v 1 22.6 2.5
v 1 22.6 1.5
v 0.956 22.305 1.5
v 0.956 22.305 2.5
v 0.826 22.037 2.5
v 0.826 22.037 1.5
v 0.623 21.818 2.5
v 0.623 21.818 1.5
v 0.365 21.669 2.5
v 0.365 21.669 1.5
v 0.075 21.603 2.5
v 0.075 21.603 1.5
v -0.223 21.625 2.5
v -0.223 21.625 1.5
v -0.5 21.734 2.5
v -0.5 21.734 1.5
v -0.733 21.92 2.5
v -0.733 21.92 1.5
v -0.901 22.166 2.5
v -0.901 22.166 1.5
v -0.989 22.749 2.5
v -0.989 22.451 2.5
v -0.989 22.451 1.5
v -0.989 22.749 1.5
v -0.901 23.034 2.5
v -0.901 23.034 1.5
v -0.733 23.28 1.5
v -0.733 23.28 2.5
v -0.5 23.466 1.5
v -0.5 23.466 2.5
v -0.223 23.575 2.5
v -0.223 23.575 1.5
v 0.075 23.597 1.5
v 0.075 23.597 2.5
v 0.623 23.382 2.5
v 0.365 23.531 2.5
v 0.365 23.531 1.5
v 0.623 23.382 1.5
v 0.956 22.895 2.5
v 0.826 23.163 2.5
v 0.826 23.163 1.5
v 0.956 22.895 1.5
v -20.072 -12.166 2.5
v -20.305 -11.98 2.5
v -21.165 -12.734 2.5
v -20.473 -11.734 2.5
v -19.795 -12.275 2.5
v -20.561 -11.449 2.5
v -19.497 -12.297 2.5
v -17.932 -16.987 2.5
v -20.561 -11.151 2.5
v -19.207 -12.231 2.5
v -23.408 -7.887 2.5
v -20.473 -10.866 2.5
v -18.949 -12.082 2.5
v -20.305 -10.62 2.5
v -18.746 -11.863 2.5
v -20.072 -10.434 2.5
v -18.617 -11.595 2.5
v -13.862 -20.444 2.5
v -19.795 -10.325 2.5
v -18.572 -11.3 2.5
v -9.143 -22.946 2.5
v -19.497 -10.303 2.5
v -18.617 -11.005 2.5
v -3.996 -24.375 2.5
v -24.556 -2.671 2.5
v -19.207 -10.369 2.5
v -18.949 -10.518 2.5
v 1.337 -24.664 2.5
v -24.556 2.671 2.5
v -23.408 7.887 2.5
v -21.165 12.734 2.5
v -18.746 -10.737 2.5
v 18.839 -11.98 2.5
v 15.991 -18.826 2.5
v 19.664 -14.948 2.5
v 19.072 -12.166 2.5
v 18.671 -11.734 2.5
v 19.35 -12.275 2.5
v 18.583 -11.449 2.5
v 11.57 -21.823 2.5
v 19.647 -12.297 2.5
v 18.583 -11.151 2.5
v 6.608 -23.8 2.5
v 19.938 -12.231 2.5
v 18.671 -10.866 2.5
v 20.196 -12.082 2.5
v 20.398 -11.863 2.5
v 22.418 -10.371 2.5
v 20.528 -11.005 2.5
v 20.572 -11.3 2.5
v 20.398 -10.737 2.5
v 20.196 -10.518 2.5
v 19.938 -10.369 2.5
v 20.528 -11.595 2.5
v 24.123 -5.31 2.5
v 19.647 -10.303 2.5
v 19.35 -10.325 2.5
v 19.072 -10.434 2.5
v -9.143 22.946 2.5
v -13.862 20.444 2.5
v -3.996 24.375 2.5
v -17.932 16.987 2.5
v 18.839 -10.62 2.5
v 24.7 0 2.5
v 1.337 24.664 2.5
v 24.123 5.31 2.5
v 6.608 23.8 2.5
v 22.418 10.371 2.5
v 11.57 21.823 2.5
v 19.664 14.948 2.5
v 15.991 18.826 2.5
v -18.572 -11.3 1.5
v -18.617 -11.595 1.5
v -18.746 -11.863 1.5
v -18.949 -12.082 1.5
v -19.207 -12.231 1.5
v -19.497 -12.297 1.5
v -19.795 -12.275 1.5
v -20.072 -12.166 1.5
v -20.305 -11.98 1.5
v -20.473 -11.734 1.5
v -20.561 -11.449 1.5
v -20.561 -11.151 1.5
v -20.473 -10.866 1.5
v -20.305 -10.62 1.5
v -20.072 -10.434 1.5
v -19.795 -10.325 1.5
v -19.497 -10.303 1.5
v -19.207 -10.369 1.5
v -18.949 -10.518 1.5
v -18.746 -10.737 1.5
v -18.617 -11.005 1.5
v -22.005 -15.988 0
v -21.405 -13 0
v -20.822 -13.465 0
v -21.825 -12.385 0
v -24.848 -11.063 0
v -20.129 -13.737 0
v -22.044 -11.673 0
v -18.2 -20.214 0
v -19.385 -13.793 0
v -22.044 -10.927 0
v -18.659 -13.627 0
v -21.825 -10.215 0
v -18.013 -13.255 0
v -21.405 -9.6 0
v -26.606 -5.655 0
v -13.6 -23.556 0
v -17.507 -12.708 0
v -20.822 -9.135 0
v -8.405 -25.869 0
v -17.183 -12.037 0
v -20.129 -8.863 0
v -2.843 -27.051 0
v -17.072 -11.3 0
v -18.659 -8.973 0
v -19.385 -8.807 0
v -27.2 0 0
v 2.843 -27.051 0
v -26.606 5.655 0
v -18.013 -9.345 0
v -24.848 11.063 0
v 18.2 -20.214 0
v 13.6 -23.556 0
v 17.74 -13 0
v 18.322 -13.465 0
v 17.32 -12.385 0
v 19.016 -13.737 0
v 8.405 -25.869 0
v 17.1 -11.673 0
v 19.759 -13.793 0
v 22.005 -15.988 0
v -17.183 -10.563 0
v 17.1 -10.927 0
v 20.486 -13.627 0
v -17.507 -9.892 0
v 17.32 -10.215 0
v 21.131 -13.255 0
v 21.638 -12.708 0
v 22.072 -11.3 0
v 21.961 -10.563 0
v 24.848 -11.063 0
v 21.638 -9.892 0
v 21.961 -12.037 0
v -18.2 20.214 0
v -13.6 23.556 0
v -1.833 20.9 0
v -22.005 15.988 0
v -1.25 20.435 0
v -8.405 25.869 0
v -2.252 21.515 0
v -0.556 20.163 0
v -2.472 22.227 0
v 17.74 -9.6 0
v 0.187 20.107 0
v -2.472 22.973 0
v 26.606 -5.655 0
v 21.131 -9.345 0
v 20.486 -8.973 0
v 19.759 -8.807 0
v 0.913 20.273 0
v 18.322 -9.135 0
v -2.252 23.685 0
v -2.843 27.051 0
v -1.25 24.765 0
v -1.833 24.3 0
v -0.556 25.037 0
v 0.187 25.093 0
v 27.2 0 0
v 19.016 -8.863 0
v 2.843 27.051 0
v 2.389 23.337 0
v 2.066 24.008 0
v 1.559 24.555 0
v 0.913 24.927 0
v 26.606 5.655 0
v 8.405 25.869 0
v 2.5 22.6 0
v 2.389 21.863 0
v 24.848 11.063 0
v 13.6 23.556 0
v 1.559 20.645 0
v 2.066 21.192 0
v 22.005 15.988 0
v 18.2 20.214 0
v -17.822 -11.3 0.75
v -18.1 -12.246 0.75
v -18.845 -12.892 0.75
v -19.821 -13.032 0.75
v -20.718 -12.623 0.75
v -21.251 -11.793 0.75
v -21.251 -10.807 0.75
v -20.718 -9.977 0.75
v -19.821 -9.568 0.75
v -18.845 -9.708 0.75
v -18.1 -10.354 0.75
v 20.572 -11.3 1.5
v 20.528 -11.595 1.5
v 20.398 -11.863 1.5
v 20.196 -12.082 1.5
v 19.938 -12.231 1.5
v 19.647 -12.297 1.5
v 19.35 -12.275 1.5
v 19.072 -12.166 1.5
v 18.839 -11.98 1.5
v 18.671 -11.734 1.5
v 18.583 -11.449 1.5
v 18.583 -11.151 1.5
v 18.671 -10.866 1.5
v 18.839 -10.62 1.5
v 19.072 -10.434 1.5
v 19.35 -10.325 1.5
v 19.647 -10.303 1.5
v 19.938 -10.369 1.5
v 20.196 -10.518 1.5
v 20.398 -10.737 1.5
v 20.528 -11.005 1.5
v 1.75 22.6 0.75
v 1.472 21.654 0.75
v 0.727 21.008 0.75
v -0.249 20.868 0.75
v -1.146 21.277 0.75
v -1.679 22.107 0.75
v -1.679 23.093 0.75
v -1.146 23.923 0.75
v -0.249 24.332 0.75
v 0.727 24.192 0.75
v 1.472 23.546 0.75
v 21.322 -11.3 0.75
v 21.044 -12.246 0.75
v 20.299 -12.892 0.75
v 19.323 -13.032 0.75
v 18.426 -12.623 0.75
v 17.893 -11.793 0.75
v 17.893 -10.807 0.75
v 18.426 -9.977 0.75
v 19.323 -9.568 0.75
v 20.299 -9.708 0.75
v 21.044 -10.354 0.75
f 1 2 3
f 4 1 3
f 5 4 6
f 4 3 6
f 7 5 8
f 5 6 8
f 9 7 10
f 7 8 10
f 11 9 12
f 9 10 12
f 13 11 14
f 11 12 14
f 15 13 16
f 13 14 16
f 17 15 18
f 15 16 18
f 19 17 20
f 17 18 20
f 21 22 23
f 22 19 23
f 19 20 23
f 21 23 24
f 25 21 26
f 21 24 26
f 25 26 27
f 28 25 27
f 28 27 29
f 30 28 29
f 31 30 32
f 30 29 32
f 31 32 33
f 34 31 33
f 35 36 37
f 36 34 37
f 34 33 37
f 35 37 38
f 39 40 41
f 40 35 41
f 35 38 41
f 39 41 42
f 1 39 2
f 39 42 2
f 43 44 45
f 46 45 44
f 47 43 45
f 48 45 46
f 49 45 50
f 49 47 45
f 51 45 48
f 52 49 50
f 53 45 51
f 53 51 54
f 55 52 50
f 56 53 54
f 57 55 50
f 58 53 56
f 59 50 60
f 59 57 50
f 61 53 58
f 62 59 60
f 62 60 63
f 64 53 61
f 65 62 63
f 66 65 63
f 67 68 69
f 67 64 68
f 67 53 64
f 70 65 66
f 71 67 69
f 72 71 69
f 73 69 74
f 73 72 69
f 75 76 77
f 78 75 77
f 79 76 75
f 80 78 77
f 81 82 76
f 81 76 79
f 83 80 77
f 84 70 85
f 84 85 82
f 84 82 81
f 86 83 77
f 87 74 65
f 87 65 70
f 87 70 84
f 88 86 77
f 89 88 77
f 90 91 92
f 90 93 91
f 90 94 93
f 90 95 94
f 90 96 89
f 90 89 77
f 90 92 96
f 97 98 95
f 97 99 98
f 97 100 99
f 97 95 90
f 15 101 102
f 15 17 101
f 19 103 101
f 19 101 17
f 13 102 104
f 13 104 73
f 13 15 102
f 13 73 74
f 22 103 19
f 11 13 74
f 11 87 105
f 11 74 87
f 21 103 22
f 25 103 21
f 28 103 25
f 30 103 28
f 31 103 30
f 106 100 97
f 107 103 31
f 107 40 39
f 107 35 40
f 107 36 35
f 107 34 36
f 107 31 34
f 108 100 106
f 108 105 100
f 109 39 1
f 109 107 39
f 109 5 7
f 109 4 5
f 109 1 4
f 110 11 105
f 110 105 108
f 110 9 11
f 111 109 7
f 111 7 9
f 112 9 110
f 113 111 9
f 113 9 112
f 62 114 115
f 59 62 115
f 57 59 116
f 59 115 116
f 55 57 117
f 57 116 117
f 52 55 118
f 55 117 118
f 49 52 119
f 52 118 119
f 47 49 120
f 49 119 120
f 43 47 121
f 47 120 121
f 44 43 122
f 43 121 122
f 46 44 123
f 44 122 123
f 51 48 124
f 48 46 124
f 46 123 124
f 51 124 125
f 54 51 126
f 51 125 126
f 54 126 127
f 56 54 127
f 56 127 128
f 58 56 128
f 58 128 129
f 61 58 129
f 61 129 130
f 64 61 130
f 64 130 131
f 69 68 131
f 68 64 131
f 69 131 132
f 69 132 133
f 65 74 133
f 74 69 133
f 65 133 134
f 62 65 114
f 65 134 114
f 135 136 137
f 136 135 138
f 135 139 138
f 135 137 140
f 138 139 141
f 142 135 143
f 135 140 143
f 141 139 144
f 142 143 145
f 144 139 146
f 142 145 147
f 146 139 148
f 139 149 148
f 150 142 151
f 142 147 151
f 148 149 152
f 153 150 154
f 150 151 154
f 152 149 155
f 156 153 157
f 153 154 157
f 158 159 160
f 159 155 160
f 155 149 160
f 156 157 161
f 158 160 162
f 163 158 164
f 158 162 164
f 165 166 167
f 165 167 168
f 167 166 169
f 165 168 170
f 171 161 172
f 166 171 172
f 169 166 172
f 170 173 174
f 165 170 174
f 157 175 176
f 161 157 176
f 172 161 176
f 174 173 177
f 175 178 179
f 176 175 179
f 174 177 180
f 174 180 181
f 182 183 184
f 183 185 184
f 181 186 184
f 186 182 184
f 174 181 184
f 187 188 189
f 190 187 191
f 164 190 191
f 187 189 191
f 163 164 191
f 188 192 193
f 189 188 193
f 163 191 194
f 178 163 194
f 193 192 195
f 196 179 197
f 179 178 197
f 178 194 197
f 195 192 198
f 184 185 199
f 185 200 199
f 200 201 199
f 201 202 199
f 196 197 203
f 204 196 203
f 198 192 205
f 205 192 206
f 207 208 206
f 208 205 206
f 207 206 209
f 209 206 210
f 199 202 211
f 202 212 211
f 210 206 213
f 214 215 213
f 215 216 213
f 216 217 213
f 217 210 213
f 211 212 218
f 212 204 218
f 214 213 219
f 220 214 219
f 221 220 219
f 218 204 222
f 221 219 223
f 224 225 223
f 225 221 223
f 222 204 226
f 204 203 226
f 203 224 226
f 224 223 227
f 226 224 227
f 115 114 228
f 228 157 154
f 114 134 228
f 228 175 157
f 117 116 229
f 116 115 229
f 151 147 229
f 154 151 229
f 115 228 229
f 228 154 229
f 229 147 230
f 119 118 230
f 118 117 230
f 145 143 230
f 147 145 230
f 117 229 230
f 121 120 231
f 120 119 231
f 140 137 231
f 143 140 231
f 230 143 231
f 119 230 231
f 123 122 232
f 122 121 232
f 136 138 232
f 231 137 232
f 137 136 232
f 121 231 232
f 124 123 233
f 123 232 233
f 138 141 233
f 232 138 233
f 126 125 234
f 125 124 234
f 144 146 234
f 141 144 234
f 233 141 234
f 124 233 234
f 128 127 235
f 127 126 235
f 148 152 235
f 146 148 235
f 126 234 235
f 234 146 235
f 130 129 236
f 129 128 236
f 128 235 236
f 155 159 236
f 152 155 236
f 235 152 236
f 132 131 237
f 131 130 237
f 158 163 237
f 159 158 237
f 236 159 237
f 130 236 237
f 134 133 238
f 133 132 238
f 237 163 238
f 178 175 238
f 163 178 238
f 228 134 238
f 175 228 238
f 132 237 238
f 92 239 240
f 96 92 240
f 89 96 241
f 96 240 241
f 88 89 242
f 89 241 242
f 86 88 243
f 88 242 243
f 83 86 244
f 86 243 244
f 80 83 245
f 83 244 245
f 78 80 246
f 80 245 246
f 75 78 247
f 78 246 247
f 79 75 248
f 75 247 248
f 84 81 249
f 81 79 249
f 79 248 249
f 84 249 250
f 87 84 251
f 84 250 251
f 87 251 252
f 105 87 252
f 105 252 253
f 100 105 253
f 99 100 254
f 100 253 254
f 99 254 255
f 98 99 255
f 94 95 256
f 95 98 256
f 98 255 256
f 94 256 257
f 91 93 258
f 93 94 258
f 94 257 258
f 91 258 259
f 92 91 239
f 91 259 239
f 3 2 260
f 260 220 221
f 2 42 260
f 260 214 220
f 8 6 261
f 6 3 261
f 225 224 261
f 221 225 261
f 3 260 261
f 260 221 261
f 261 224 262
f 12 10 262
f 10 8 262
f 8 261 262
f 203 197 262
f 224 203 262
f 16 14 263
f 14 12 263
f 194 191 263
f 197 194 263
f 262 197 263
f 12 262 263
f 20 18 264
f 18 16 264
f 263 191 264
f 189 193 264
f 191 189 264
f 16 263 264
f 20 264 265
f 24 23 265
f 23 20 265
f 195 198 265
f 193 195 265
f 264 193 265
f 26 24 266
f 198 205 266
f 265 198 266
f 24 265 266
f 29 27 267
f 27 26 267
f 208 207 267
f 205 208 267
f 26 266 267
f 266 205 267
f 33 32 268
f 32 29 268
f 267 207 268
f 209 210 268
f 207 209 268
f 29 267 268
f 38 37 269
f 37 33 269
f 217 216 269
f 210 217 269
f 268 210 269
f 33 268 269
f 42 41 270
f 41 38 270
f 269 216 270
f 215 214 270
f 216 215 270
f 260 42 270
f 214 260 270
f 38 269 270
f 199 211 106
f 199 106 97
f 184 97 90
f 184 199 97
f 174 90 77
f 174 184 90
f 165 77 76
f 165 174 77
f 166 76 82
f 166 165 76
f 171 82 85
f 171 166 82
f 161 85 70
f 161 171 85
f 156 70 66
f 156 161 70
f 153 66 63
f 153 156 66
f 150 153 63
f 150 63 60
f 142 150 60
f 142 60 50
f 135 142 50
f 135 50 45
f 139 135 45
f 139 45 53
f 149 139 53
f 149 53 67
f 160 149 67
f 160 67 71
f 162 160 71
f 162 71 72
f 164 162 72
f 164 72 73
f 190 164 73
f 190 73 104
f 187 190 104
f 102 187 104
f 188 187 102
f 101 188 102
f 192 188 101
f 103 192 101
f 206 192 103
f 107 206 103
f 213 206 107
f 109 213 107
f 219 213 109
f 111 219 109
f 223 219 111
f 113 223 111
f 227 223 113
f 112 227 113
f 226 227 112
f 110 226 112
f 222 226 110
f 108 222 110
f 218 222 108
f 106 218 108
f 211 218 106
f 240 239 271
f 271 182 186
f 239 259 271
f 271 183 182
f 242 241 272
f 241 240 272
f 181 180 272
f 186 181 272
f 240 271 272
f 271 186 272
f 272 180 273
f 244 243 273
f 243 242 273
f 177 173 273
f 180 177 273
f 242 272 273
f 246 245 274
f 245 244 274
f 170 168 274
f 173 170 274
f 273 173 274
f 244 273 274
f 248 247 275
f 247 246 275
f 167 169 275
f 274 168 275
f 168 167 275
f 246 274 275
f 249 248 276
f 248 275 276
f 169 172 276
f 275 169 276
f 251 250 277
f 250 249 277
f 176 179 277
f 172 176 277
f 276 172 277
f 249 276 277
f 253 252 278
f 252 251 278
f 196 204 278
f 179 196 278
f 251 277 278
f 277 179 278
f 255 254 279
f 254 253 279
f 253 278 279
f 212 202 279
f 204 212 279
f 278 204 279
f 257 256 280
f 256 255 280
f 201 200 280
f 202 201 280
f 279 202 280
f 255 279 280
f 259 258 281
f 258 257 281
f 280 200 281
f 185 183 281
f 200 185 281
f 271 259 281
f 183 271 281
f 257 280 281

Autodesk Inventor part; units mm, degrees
ref_plane "YZ Plane" through (0, 0, 0) normal (1, 0, 0) x (0, 1, 0)
ref_plane "XZ Plane" through (0, 0, 0) normal (0, 1, 0) x (-1, 0, 0)
ref_plane "XY Plane" through (0, 0, 0) normal (0, 0, 1) x (1, 0, 0)
sketch "Esboço1" plane through (0, 0, 0) normal (0, 0, 1) x (1, 0, 0)
  circle A0 centre (0, 0) radius 27.2
  circle A1 centre (0, 22.6) radius 1
  circle A2 centre (-19.5722, -11.3) radius 1
  circle A3 centre (0, 0) radius 27.2
  circle A4 centre (19.5722, -11.3) radius 1
  circle A5 centre (0, 0) radius 27.2
  dimension "d8" = 360
  dimension "d18" = 22.6
  dimension "d19" = 54.4
extrude "Extrusão1" add sketch "Esboço1" along normal blind 2.5
chamfer "Chanfro1" distance 2.5 angle 45 1 edges at (-27.2, 0, 2.5)
chamfer "Chanfro2" distance 1.5 angle 45 3 edges at (18.5722, -11.3, 0) (-20.5722, -11.3, 0) (-1, 22.6, 0)
properties part number "Tampa inferior"
